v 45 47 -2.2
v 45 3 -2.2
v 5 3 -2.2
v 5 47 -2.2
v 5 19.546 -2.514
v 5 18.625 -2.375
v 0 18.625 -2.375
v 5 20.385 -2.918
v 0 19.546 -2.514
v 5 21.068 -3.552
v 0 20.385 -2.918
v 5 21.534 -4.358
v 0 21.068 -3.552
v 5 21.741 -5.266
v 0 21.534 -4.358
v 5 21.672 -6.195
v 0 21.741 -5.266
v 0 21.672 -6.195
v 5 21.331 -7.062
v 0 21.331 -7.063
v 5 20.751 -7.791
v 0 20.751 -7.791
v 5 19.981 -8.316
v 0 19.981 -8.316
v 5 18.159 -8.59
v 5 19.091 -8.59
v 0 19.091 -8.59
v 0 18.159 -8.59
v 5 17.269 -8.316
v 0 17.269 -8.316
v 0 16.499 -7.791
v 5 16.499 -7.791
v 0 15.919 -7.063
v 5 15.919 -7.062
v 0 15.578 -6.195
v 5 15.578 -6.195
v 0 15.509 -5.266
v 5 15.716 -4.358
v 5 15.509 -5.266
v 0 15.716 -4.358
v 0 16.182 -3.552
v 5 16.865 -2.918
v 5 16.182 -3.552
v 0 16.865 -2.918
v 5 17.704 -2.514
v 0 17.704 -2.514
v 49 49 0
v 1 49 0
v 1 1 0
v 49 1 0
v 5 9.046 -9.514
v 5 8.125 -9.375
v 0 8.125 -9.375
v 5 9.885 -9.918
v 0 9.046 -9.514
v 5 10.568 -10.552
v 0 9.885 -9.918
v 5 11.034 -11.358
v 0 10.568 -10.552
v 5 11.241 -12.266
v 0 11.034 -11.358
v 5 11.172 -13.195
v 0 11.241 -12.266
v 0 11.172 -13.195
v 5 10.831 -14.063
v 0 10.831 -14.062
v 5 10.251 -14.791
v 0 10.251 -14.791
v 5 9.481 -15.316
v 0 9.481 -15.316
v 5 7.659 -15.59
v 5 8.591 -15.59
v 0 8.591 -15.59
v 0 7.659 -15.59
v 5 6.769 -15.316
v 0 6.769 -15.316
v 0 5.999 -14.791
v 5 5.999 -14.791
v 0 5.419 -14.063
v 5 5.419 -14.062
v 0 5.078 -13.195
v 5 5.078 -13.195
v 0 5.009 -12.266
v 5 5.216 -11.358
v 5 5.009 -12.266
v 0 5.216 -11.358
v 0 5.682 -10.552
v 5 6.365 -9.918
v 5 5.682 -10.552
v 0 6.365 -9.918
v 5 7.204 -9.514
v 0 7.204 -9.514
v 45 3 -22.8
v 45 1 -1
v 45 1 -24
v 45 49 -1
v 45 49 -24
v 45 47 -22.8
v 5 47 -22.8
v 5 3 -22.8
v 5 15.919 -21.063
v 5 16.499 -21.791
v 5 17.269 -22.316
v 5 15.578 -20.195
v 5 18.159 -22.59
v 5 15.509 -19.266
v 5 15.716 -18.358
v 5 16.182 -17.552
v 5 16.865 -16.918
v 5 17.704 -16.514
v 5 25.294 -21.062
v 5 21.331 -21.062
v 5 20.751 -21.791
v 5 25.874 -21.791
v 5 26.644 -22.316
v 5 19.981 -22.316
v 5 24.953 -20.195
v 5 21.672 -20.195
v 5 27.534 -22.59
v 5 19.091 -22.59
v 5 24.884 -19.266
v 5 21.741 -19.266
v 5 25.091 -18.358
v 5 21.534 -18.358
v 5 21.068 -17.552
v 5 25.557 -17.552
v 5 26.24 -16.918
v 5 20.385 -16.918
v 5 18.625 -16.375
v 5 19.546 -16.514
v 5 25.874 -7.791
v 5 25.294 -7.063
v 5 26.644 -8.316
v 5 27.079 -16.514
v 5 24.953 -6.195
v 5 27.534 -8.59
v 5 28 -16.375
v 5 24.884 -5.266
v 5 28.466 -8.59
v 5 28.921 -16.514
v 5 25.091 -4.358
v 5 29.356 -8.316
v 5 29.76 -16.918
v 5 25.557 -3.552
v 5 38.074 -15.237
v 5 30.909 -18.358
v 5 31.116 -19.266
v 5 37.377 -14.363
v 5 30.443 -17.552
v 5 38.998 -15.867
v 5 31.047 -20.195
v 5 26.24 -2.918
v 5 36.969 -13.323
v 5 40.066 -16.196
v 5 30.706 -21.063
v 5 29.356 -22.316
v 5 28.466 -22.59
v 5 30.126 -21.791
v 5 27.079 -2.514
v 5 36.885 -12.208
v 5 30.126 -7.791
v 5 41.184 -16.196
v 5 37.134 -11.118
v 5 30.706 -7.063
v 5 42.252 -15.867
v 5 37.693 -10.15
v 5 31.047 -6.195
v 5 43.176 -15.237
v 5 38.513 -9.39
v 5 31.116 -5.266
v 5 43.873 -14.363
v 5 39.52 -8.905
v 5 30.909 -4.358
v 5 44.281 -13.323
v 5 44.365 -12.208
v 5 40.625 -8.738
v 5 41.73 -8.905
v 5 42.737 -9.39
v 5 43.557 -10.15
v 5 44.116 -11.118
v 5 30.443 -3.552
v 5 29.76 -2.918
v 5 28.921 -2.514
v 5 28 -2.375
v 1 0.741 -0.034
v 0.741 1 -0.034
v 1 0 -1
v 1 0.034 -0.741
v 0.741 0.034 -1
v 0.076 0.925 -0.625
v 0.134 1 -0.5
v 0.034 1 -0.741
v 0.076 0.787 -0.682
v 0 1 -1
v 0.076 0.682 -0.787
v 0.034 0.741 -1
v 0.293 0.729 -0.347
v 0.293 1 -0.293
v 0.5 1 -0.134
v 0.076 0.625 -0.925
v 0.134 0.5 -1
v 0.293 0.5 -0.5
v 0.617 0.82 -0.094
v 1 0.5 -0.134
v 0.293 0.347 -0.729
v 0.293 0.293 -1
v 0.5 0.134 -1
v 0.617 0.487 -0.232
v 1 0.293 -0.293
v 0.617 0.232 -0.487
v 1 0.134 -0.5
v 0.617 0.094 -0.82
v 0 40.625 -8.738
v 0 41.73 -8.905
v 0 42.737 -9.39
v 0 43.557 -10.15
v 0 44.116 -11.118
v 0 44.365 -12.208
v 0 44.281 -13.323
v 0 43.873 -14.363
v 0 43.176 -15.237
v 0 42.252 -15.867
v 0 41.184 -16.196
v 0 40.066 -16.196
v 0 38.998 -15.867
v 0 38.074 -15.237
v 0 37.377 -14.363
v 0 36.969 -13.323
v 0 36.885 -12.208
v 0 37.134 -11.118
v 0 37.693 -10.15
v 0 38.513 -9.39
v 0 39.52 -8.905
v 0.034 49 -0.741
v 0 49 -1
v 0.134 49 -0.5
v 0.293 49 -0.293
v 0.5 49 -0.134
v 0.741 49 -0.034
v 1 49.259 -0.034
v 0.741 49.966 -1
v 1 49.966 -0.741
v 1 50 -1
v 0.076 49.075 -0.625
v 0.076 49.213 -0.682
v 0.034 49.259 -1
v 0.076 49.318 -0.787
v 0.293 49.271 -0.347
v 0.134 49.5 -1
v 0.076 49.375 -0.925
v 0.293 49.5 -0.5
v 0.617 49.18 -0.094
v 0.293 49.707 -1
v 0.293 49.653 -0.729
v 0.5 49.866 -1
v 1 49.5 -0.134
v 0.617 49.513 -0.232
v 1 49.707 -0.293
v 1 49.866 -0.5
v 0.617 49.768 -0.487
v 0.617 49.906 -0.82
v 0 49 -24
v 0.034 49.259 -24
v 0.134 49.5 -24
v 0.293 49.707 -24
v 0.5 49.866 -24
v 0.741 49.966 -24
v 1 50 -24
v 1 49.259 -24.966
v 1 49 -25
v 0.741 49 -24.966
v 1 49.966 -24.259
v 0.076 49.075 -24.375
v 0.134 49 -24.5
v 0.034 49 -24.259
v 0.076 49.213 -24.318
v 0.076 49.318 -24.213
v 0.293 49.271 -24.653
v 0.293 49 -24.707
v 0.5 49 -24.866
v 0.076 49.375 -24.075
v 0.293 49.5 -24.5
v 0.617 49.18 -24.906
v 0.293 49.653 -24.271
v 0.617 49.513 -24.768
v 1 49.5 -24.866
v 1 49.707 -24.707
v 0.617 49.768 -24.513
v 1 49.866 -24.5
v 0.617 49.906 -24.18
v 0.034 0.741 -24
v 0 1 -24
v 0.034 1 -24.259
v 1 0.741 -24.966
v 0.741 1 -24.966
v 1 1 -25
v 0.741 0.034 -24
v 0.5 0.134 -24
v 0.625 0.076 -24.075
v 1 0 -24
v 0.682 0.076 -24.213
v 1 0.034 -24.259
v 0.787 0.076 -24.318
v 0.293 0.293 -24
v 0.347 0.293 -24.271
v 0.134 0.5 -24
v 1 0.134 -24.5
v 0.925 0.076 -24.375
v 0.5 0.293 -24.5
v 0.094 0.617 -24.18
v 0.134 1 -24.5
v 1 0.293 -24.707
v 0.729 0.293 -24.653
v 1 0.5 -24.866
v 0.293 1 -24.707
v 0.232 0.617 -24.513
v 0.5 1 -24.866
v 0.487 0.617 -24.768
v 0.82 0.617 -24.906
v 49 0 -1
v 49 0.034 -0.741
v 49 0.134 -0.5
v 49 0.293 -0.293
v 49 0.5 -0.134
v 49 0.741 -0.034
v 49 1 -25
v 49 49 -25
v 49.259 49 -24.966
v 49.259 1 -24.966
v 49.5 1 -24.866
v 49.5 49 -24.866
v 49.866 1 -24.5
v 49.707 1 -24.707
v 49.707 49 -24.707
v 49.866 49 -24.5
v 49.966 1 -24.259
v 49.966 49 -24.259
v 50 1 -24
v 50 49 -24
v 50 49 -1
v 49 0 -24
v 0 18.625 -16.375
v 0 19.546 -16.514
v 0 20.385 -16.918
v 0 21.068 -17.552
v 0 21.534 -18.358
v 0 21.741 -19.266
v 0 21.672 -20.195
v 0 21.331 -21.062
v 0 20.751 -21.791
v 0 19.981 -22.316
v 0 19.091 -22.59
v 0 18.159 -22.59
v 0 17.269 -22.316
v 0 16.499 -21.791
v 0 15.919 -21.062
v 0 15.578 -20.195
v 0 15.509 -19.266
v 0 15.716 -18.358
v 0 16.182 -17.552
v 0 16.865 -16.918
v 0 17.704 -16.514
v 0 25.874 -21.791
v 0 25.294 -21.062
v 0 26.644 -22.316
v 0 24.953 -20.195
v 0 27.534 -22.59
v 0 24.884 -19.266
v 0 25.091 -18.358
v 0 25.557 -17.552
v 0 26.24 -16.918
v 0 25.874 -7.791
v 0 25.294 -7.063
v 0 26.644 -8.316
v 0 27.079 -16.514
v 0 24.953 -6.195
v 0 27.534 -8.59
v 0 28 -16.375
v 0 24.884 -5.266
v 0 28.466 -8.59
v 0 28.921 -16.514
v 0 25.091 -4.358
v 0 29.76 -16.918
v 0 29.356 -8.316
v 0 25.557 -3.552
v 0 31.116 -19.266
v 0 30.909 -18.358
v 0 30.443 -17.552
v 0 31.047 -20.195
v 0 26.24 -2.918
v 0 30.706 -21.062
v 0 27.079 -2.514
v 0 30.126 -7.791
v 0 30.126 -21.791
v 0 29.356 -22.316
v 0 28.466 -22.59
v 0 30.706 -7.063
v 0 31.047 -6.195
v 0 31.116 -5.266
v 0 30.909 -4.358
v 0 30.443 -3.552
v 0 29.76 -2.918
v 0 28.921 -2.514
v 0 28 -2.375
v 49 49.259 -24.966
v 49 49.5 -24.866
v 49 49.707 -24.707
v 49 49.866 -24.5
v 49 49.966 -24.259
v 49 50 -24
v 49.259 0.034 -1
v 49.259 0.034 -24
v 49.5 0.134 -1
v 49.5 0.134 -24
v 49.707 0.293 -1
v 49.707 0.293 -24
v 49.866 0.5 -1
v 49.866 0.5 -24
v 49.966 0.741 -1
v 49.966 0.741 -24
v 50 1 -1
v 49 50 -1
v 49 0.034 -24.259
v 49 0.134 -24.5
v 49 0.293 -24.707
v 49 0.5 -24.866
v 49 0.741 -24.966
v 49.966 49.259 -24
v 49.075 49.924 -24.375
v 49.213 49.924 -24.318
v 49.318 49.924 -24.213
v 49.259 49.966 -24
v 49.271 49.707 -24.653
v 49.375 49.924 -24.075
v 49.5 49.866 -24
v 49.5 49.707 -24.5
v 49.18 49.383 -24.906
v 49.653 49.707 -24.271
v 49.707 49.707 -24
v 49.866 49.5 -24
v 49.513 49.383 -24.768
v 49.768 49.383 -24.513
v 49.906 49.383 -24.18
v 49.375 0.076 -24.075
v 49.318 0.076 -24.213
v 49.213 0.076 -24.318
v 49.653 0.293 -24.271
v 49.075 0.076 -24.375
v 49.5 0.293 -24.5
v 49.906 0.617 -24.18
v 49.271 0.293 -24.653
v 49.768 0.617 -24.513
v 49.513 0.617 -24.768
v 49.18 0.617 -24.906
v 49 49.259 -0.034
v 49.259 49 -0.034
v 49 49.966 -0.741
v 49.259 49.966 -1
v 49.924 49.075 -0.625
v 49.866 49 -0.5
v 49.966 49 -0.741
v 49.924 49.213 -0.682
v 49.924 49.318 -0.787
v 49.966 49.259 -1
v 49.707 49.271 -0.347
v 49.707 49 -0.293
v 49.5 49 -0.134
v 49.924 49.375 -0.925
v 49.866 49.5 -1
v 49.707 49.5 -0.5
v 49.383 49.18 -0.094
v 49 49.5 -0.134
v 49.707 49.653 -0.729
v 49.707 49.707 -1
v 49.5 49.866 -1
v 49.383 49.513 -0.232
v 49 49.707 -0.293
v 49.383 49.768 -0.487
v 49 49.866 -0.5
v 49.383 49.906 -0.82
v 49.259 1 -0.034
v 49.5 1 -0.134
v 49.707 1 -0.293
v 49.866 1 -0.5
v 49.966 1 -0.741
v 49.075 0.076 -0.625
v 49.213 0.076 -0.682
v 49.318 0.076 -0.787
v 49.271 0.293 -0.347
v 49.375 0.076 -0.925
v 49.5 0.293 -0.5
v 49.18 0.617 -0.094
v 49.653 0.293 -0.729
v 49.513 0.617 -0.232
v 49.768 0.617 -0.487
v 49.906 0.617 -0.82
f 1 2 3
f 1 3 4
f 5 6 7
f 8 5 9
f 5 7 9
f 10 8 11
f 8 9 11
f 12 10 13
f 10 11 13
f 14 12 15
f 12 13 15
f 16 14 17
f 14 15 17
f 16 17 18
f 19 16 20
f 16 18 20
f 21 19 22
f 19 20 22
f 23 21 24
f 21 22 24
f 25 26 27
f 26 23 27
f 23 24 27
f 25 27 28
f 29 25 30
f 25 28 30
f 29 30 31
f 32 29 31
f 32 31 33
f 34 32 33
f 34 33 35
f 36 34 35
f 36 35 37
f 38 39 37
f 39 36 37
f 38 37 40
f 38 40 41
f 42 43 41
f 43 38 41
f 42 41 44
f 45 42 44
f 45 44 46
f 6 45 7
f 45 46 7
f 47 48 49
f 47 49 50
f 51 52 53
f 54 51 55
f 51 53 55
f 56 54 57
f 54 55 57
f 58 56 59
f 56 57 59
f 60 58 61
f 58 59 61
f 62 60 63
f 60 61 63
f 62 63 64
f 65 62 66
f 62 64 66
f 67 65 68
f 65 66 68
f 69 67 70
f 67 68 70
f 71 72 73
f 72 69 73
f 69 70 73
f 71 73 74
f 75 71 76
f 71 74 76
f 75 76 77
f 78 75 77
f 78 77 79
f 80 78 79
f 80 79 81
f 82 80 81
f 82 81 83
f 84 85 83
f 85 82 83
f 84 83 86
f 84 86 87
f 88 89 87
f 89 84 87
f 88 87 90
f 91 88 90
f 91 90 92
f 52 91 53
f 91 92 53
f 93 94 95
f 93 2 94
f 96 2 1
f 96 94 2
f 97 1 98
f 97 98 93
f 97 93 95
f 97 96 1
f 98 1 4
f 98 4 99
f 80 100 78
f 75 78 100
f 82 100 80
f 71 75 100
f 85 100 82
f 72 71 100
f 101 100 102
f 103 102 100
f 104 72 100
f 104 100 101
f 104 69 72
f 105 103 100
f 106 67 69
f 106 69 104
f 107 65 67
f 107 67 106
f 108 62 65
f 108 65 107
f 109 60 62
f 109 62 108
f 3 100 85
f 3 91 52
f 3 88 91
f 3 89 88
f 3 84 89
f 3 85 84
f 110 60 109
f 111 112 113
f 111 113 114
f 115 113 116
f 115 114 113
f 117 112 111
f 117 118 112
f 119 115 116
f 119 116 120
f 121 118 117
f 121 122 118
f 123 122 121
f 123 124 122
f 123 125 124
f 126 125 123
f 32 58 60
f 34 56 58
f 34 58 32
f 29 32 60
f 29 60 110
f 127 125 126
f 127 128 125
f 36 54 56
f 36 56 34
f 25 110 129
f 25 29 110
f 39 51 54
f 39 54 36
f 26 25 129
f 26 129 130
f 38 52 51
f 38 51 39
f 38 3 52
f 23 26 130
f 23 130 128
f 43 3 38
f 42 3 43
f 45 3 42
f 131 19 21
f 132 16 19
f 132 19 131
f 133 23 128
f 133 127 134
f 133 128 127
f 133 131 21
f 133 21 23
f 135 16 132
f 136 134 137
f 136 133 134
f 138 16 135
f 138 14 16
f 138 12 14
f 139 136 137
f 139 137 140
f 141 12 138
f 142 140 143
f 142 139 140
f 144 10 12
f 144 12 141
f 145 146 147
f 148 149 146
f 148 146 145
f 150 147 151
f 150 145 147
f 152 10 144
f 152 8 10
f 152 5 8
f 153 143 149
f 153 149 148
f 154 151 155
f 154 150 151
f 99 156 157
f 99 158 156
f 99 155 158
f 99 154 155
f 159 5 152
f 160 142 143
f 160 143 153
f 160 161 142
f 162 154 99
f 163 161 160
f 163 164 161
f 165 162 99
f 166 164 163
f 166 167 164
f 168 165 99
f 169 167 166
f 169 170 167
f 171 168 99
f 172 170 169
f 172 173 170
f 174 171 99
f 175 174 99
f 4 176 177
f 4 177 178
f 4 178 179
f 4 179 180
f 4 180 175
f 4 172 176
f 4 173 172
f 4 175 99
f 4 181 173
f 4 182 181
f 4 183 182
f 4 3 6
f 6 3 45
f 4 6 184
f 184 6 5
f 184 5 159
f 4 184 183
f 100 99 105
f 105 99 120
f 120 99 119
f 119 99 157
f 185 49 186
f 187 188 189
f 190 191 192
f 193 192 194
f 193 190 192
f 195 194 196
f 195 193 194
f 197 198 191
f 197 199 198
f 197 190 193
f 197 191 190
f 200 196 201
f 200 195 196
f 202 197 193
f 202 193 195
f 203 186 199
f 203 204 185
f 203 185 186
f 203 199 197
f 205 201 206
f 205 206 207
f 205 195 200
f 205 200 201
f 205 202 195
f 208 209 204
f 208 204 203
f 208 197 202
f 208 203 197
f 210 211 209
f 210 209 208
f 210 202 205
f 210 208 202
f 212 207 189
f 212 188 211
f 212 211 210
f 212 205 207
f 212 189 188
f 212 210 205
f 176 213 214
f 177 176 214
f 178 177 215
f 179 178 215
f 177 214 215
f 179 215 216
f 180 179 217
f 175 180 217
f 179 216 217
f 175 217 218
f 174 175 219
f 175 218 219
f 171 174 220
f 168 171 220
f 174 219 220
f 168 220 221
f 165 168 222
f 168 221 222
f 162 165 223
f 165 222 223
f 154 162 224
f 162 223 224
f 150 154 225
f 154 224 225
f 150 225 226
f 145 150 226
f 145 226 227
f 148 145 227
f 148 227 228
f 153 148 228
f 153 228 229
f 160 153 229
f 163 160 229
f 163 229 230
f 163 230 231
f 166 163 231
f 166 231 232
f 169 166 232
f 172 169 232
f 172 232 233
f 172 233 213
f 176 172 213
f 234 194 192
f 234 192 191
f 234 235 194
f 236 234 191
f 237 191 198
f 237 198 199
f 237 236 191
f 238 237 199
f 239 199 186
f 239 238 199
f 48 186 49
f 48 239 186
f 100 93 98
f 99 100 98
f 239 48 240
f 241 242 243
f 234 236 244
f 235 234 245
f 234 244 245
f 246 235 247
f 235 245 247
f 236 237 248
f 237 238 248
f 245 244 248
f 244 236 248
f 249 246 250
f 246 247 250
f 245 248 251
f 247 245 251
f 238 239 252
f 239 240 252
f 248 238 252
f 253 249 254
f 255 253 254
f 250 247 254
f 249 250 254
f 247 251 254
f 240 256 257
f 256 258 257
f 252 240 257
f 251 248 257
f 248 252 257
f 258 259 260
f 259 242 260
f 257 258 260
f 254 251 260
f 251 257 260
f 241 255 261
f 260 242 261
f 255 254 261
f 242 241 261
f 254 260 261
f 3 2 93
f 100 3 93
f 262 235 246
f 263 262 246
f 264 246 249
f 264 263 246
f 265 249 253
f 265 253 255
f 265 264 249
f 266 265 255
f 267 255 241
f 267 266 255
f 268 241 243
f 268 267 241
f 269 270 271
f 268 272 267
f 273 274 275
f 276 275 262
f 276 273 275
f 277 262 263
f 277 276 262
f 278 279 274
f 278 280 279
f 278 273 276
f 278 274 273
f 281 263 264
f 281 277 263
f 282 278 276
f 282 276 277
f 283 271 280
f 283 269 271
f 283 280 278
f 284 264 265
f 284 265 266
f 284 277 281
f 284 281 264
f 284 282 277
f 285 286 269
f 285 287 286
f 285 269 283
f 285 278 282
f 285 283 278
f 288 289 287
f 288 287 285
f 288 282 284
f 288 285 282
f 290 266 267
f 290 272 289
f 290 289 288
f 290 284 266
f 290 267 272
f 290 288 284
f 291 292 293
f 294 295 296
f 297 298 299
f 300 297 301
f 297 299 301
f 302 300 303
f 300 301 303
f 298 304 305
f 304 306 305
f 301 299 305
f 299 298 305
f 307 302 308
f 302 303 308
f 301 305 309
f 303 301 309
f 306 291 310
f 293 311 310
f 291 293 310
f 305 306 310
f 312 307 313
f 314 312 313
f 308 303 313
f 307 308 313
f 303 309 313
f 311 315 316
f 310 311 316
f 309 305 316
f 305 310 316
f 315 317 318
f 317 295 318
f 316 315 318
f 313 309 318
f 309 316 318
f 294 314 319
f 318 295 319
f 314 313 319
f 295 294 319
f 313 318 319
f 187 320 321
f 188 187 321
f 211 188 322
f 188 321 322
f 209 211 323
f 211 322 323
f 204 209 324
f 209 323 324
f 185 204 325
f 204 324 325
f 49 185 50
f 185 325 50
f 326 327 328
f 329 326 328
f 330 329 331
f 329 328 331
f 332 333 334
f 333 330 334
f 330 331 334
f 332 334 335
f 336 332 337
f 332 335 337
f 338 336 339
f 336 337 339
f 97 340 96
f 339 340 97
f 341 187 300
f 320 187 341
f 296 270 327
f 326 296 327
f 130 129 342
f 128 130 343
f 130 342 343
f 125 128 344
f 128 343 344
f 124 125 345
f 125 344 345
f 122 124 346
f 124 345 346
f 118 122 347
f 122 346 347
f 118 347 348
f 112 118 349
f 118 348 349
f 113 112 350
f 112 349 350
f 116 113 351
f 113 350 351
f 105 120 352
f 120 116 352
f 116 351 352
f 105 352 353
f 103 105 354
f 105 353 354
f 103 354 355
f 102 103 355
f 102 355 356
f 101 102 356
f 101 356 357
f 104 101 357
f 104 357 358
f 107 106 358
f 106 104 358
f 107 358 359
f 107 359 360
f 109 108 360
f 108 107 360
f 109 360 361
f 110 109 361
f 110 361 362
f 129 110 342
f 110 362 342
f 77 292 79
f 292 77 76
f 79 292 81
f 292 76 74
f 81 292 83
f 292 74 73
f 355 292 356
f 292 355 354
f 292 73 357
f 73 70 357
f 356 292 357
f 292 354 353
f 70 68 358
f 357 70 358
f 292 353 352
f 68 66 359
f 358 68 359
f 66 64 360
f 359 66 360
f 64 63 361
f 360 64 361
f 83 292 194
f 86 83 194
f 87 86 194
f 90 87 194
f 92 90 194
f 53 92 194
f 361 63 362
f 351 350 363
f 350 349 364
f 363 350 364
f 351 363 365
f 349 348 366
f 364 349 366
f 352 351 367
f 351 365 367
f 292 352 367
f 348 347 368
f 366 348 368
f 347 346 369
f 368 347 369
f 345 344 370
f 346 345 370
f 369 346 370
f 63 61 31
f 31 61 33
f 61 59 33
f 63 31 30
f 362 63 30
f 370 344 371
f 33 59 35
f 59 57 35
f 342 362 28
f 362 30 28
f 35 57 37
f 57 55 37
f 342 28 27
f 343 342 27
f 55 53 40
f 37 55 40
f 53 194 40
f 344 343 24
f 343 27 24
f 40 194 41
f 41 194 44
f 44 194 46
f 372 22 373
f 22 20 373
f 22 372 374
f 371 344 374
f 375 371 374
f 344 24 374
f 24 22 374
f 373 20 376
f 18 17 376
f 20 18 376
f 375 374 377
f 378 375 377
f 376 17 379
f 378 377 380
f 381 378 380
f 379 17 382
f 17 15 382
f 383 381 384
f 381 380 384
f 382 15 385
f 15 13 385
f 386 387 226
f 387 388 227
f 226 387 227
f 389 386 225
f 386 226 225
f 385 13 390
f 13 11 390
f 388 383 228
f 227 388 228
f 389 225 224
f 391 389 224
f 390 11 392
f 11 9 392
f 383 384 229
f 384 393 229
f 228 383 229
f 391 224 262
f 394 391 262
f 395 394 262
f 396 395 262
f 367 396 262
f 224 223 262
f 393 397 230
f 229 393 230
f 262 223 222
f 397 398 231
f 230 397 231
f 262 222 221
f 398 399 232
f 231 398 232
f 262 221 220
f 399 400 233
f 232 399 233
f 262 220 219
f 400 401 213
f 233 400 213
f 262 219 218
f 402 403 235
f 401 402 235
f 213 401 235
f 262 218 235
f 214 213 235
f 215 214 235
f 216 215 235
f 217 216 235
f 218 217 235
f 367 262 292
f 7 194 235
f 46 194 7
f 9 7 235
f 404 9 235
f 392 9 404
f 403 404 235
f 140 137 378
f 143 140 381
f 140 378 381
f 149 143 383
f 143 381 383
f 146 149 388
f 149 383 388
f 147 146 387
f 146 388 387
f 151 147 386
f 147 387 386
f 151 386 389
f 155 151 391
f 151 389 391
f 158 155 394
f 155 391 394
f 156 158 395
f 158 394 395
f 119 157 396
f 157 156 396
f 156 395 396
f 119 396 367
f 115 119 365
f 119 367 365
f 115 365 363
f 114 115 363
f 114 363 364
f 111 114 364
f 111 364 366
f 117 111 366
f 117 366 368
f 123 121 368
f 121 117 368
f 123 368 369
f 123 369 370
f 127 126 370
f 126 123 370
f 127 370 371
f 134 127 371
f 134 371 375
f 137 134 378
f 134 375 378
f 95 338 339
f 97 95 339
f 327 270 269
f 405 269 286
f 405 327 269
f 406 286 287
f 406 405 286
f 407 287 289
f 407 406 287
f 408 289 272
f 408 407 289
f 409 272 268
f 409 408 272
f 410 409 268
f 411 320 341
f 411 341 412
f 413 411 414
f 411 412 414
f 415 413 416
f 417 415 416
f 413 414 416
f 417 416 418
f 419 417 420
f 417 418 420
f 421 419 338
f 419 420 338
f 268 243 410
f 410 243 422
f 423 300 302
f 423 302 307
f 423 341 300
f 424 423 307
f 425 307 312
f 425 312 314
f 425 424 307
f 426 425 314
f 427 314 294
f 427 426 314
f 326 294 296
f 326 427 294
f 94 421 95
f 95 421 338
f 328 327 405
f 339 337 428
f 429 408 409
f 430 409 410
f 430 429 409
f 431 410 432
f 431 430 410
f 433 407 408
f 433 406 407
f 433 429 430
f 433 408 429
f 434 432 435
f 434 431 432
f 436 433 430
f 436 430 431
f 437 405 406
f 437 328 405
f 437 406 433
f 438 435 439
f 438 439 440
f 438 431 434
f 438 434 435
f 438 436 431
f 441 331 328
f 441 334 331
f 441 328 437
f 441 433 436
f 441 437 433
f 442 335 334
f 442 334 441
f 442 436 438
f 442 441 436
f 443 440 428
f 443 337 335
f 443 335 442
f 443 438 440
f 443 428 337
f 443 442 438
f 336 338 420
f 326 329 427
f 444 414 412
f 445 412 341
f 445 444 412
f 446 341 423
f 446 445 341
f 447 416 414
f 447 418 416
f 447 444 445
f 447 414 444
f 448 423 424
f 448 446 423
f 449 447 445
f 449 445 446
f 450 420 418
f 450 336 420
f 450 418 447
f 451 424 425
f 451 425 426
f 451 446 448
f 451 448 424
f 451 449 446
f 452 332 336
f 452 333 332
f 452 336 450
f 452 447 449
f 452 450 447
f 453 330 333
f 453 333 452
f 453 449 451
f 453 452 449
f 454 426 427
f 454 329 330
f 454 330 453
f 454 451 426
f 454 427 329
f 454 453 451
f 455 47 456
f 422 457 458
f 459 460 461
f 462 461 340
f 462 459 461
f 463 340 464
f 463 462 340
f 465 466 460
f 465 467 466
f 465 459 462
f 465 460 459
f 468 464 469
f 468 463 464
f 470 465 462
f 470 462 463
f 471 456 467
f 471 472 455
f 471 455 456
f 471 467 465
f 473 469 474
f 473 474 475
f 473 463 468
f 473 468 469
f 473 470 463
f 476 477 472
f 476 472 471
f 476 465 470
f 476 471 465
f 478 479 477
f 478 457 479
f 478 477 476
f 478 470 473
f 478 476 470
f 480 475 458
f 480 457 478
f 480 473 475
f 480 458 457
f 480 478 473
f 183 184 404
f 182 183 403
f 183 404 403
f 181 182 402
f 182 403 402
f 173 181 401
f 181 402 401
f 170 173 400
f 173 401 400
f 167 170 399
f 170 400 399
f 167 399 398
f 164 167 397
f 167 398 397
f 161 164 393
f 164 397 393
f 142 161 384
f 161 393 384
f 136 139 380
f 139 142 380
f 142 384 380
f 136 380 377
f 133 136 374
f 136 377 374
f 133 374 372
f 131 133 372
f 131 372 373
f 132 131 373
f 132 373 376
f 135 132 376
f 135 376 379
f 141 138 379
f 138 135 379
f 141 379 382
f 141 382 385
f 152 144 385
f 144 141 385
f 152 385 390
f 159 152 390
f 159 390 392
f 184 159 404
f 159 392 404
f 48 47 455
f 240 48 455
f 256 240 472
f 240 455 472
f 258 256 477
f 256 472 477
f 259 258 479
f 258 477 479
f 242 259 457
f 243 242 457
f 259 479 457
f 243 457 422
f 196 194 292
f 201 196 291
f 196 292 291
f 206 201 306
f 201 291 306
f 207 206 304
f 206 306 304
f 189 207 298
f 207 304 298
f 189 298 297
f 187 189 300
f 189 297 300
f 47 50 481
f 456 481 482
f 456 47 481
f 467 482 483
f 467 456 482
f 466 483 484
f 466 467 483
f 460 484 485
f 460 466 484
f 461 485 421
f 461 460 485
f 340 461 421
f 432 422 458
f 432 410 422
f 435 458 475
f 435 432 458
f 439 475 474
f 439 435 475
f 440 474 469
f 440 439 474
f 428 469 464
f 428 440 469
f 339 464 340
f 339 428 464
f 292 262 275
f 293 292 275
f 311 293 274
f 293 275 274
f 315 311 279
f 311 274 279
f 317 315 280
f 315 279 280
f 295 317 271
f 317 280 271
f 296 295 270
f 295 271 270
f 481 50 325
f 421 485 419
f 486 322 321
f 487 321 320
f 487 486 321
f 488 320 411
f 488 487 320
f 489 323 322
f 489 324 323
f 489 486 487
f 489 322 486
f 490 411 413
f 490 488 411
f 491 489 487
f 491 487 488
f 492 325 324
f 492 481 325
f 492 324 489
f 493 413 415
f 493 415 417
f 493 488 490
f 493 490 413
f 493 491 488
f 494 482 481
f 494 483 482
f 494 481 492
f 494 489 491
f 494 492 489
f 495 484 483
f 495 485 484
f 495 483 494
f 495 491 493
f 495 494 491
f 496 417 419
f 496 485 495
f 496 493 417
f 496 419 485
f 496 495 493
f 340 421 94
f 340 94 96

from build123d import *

# Parameters (mm, degrees)
SKETCH_1_W          = 50
SKETCH_1_H          = 50
EXTRUDE_1_DEPTH     = 25
SHELL_2_T           = 5
SKETCH_3_R          = 3.75
CUT_EXTRUDE_3_DEPTH = 17.5
FILLET_2_R          = 1
SKETCH_8_W          = 23
SKETCH_8_H          = 48
CUT_EXTRUDE_5_DEPTH = 5
SKETCH_2_R          = 3.125
CUT_EXTRUDE_6_DEPTH = 10
SKETCH_9_W          = 20.6
SKETCH_9_H          = 44
SKETCH_9_W_2        = 15
SKETCH_9_H_2        = 40
CUT_EXTRUDE_7_DEPTH = 40


with BuildPart() as part:
    # 草图1 → 凸台-拉伸1 (new body)
    with BuildSketch(Plane.XY):
        with Locations((25, 25)):
            Rectangle(SKETCH_1_W, SKETCH_1_H)
    extrude(amount=-EXTRUDE_1_DEPTH)

    # 抽壳2 (no face opened: a closed hollow body)
    add(offset(amount=-SHELL_2_T, mode=Mode.PRIVATE), mode=Mode.SUBTRACT)

    # 草图3 → 切除-拉伸3 (cut)
    with BuildSketch(Plane.ZY):
        with Locations((-12.488340482, 40.625)):
            Circle(SKETCH_3_R)
    extrude(amount=-CUT_EXTRUDE_3_DEPTH, mode=Mode.SUBTRACT)

    # 圆角2
    fillet_2_edges = [part.edges().sort_by_distance(p)[0] for p in [
        (50, 25, -25),
        (25, 50, -25),
        (0, 25, -25),
        (25, 50, 0),
        (50, 25, 0),
        (25, 0, 0),
        (0, 25, 0),
        (0, 50, -12.5),
        (50, 50, -12.5),
        (50, 0, -12.5),
        (0, 0, -12.5),
        (25, 0, -25),
    ]]
    fillet(fillet_2_edges, radius=FILLET_2_R)

    # 草图8 → 切除-拉伸5 (cut)
    with BuildSketch(Plane(origin=(50, 0, 0), x_dir=(0, 0, -1), z_dir=(1, 0, 0))):
        with Locations((12.5, 25)):
            Rectangle(SKETCH_8_W, SKETCH_8_H)
    extrude(amount=-CUT_EXTRUDE_5_DEPTH, mode=Mode.SUBTRACT)

    # 草图2 → 切除-拉伸6 (cut)
    with BuildSketch(Plane.ZY):
        with Locations((-19.5, 18.625)):
            Circle(SKETCH_2_R)
        with Locations((-19.5, 28)):
            Circle(SKETCH_2_R)
        with Locations((-5.5, 28)):
            Circle(SKETCH_2_R)
        with Locations((-5.5, 18.625)):
            Circle(SKETCH_2_R)
        with Locations((-12.5, 8.125)):
            Circle(SKETCH_2_R)
    extrude(amount=-CUT_EXTRUDE_6_DEPTH, mode=Mode.SUBTRACT)

    # 草图9 → 切除-拉伸7 (cut)
    with BuildSketch(Plane(origin=(45, 0, 0), x_dir=(0, 0, -1), z_dir=(1, 0, 0))):
        with Locations((12.5, 25)):
            Rectangle(SKETCH_9_W, SKETCH_9_H)
        with Locations((12.5, 25)):
            Rectangle(SKETCH_9_W_2, SKETCH_9_H_2, mode=Mode.SUBTRACT)
    extrude(amount=-CUT_EXTRUDE_7_DEPTH, mode=Mode.SUBTRACT)


solid = part.part
